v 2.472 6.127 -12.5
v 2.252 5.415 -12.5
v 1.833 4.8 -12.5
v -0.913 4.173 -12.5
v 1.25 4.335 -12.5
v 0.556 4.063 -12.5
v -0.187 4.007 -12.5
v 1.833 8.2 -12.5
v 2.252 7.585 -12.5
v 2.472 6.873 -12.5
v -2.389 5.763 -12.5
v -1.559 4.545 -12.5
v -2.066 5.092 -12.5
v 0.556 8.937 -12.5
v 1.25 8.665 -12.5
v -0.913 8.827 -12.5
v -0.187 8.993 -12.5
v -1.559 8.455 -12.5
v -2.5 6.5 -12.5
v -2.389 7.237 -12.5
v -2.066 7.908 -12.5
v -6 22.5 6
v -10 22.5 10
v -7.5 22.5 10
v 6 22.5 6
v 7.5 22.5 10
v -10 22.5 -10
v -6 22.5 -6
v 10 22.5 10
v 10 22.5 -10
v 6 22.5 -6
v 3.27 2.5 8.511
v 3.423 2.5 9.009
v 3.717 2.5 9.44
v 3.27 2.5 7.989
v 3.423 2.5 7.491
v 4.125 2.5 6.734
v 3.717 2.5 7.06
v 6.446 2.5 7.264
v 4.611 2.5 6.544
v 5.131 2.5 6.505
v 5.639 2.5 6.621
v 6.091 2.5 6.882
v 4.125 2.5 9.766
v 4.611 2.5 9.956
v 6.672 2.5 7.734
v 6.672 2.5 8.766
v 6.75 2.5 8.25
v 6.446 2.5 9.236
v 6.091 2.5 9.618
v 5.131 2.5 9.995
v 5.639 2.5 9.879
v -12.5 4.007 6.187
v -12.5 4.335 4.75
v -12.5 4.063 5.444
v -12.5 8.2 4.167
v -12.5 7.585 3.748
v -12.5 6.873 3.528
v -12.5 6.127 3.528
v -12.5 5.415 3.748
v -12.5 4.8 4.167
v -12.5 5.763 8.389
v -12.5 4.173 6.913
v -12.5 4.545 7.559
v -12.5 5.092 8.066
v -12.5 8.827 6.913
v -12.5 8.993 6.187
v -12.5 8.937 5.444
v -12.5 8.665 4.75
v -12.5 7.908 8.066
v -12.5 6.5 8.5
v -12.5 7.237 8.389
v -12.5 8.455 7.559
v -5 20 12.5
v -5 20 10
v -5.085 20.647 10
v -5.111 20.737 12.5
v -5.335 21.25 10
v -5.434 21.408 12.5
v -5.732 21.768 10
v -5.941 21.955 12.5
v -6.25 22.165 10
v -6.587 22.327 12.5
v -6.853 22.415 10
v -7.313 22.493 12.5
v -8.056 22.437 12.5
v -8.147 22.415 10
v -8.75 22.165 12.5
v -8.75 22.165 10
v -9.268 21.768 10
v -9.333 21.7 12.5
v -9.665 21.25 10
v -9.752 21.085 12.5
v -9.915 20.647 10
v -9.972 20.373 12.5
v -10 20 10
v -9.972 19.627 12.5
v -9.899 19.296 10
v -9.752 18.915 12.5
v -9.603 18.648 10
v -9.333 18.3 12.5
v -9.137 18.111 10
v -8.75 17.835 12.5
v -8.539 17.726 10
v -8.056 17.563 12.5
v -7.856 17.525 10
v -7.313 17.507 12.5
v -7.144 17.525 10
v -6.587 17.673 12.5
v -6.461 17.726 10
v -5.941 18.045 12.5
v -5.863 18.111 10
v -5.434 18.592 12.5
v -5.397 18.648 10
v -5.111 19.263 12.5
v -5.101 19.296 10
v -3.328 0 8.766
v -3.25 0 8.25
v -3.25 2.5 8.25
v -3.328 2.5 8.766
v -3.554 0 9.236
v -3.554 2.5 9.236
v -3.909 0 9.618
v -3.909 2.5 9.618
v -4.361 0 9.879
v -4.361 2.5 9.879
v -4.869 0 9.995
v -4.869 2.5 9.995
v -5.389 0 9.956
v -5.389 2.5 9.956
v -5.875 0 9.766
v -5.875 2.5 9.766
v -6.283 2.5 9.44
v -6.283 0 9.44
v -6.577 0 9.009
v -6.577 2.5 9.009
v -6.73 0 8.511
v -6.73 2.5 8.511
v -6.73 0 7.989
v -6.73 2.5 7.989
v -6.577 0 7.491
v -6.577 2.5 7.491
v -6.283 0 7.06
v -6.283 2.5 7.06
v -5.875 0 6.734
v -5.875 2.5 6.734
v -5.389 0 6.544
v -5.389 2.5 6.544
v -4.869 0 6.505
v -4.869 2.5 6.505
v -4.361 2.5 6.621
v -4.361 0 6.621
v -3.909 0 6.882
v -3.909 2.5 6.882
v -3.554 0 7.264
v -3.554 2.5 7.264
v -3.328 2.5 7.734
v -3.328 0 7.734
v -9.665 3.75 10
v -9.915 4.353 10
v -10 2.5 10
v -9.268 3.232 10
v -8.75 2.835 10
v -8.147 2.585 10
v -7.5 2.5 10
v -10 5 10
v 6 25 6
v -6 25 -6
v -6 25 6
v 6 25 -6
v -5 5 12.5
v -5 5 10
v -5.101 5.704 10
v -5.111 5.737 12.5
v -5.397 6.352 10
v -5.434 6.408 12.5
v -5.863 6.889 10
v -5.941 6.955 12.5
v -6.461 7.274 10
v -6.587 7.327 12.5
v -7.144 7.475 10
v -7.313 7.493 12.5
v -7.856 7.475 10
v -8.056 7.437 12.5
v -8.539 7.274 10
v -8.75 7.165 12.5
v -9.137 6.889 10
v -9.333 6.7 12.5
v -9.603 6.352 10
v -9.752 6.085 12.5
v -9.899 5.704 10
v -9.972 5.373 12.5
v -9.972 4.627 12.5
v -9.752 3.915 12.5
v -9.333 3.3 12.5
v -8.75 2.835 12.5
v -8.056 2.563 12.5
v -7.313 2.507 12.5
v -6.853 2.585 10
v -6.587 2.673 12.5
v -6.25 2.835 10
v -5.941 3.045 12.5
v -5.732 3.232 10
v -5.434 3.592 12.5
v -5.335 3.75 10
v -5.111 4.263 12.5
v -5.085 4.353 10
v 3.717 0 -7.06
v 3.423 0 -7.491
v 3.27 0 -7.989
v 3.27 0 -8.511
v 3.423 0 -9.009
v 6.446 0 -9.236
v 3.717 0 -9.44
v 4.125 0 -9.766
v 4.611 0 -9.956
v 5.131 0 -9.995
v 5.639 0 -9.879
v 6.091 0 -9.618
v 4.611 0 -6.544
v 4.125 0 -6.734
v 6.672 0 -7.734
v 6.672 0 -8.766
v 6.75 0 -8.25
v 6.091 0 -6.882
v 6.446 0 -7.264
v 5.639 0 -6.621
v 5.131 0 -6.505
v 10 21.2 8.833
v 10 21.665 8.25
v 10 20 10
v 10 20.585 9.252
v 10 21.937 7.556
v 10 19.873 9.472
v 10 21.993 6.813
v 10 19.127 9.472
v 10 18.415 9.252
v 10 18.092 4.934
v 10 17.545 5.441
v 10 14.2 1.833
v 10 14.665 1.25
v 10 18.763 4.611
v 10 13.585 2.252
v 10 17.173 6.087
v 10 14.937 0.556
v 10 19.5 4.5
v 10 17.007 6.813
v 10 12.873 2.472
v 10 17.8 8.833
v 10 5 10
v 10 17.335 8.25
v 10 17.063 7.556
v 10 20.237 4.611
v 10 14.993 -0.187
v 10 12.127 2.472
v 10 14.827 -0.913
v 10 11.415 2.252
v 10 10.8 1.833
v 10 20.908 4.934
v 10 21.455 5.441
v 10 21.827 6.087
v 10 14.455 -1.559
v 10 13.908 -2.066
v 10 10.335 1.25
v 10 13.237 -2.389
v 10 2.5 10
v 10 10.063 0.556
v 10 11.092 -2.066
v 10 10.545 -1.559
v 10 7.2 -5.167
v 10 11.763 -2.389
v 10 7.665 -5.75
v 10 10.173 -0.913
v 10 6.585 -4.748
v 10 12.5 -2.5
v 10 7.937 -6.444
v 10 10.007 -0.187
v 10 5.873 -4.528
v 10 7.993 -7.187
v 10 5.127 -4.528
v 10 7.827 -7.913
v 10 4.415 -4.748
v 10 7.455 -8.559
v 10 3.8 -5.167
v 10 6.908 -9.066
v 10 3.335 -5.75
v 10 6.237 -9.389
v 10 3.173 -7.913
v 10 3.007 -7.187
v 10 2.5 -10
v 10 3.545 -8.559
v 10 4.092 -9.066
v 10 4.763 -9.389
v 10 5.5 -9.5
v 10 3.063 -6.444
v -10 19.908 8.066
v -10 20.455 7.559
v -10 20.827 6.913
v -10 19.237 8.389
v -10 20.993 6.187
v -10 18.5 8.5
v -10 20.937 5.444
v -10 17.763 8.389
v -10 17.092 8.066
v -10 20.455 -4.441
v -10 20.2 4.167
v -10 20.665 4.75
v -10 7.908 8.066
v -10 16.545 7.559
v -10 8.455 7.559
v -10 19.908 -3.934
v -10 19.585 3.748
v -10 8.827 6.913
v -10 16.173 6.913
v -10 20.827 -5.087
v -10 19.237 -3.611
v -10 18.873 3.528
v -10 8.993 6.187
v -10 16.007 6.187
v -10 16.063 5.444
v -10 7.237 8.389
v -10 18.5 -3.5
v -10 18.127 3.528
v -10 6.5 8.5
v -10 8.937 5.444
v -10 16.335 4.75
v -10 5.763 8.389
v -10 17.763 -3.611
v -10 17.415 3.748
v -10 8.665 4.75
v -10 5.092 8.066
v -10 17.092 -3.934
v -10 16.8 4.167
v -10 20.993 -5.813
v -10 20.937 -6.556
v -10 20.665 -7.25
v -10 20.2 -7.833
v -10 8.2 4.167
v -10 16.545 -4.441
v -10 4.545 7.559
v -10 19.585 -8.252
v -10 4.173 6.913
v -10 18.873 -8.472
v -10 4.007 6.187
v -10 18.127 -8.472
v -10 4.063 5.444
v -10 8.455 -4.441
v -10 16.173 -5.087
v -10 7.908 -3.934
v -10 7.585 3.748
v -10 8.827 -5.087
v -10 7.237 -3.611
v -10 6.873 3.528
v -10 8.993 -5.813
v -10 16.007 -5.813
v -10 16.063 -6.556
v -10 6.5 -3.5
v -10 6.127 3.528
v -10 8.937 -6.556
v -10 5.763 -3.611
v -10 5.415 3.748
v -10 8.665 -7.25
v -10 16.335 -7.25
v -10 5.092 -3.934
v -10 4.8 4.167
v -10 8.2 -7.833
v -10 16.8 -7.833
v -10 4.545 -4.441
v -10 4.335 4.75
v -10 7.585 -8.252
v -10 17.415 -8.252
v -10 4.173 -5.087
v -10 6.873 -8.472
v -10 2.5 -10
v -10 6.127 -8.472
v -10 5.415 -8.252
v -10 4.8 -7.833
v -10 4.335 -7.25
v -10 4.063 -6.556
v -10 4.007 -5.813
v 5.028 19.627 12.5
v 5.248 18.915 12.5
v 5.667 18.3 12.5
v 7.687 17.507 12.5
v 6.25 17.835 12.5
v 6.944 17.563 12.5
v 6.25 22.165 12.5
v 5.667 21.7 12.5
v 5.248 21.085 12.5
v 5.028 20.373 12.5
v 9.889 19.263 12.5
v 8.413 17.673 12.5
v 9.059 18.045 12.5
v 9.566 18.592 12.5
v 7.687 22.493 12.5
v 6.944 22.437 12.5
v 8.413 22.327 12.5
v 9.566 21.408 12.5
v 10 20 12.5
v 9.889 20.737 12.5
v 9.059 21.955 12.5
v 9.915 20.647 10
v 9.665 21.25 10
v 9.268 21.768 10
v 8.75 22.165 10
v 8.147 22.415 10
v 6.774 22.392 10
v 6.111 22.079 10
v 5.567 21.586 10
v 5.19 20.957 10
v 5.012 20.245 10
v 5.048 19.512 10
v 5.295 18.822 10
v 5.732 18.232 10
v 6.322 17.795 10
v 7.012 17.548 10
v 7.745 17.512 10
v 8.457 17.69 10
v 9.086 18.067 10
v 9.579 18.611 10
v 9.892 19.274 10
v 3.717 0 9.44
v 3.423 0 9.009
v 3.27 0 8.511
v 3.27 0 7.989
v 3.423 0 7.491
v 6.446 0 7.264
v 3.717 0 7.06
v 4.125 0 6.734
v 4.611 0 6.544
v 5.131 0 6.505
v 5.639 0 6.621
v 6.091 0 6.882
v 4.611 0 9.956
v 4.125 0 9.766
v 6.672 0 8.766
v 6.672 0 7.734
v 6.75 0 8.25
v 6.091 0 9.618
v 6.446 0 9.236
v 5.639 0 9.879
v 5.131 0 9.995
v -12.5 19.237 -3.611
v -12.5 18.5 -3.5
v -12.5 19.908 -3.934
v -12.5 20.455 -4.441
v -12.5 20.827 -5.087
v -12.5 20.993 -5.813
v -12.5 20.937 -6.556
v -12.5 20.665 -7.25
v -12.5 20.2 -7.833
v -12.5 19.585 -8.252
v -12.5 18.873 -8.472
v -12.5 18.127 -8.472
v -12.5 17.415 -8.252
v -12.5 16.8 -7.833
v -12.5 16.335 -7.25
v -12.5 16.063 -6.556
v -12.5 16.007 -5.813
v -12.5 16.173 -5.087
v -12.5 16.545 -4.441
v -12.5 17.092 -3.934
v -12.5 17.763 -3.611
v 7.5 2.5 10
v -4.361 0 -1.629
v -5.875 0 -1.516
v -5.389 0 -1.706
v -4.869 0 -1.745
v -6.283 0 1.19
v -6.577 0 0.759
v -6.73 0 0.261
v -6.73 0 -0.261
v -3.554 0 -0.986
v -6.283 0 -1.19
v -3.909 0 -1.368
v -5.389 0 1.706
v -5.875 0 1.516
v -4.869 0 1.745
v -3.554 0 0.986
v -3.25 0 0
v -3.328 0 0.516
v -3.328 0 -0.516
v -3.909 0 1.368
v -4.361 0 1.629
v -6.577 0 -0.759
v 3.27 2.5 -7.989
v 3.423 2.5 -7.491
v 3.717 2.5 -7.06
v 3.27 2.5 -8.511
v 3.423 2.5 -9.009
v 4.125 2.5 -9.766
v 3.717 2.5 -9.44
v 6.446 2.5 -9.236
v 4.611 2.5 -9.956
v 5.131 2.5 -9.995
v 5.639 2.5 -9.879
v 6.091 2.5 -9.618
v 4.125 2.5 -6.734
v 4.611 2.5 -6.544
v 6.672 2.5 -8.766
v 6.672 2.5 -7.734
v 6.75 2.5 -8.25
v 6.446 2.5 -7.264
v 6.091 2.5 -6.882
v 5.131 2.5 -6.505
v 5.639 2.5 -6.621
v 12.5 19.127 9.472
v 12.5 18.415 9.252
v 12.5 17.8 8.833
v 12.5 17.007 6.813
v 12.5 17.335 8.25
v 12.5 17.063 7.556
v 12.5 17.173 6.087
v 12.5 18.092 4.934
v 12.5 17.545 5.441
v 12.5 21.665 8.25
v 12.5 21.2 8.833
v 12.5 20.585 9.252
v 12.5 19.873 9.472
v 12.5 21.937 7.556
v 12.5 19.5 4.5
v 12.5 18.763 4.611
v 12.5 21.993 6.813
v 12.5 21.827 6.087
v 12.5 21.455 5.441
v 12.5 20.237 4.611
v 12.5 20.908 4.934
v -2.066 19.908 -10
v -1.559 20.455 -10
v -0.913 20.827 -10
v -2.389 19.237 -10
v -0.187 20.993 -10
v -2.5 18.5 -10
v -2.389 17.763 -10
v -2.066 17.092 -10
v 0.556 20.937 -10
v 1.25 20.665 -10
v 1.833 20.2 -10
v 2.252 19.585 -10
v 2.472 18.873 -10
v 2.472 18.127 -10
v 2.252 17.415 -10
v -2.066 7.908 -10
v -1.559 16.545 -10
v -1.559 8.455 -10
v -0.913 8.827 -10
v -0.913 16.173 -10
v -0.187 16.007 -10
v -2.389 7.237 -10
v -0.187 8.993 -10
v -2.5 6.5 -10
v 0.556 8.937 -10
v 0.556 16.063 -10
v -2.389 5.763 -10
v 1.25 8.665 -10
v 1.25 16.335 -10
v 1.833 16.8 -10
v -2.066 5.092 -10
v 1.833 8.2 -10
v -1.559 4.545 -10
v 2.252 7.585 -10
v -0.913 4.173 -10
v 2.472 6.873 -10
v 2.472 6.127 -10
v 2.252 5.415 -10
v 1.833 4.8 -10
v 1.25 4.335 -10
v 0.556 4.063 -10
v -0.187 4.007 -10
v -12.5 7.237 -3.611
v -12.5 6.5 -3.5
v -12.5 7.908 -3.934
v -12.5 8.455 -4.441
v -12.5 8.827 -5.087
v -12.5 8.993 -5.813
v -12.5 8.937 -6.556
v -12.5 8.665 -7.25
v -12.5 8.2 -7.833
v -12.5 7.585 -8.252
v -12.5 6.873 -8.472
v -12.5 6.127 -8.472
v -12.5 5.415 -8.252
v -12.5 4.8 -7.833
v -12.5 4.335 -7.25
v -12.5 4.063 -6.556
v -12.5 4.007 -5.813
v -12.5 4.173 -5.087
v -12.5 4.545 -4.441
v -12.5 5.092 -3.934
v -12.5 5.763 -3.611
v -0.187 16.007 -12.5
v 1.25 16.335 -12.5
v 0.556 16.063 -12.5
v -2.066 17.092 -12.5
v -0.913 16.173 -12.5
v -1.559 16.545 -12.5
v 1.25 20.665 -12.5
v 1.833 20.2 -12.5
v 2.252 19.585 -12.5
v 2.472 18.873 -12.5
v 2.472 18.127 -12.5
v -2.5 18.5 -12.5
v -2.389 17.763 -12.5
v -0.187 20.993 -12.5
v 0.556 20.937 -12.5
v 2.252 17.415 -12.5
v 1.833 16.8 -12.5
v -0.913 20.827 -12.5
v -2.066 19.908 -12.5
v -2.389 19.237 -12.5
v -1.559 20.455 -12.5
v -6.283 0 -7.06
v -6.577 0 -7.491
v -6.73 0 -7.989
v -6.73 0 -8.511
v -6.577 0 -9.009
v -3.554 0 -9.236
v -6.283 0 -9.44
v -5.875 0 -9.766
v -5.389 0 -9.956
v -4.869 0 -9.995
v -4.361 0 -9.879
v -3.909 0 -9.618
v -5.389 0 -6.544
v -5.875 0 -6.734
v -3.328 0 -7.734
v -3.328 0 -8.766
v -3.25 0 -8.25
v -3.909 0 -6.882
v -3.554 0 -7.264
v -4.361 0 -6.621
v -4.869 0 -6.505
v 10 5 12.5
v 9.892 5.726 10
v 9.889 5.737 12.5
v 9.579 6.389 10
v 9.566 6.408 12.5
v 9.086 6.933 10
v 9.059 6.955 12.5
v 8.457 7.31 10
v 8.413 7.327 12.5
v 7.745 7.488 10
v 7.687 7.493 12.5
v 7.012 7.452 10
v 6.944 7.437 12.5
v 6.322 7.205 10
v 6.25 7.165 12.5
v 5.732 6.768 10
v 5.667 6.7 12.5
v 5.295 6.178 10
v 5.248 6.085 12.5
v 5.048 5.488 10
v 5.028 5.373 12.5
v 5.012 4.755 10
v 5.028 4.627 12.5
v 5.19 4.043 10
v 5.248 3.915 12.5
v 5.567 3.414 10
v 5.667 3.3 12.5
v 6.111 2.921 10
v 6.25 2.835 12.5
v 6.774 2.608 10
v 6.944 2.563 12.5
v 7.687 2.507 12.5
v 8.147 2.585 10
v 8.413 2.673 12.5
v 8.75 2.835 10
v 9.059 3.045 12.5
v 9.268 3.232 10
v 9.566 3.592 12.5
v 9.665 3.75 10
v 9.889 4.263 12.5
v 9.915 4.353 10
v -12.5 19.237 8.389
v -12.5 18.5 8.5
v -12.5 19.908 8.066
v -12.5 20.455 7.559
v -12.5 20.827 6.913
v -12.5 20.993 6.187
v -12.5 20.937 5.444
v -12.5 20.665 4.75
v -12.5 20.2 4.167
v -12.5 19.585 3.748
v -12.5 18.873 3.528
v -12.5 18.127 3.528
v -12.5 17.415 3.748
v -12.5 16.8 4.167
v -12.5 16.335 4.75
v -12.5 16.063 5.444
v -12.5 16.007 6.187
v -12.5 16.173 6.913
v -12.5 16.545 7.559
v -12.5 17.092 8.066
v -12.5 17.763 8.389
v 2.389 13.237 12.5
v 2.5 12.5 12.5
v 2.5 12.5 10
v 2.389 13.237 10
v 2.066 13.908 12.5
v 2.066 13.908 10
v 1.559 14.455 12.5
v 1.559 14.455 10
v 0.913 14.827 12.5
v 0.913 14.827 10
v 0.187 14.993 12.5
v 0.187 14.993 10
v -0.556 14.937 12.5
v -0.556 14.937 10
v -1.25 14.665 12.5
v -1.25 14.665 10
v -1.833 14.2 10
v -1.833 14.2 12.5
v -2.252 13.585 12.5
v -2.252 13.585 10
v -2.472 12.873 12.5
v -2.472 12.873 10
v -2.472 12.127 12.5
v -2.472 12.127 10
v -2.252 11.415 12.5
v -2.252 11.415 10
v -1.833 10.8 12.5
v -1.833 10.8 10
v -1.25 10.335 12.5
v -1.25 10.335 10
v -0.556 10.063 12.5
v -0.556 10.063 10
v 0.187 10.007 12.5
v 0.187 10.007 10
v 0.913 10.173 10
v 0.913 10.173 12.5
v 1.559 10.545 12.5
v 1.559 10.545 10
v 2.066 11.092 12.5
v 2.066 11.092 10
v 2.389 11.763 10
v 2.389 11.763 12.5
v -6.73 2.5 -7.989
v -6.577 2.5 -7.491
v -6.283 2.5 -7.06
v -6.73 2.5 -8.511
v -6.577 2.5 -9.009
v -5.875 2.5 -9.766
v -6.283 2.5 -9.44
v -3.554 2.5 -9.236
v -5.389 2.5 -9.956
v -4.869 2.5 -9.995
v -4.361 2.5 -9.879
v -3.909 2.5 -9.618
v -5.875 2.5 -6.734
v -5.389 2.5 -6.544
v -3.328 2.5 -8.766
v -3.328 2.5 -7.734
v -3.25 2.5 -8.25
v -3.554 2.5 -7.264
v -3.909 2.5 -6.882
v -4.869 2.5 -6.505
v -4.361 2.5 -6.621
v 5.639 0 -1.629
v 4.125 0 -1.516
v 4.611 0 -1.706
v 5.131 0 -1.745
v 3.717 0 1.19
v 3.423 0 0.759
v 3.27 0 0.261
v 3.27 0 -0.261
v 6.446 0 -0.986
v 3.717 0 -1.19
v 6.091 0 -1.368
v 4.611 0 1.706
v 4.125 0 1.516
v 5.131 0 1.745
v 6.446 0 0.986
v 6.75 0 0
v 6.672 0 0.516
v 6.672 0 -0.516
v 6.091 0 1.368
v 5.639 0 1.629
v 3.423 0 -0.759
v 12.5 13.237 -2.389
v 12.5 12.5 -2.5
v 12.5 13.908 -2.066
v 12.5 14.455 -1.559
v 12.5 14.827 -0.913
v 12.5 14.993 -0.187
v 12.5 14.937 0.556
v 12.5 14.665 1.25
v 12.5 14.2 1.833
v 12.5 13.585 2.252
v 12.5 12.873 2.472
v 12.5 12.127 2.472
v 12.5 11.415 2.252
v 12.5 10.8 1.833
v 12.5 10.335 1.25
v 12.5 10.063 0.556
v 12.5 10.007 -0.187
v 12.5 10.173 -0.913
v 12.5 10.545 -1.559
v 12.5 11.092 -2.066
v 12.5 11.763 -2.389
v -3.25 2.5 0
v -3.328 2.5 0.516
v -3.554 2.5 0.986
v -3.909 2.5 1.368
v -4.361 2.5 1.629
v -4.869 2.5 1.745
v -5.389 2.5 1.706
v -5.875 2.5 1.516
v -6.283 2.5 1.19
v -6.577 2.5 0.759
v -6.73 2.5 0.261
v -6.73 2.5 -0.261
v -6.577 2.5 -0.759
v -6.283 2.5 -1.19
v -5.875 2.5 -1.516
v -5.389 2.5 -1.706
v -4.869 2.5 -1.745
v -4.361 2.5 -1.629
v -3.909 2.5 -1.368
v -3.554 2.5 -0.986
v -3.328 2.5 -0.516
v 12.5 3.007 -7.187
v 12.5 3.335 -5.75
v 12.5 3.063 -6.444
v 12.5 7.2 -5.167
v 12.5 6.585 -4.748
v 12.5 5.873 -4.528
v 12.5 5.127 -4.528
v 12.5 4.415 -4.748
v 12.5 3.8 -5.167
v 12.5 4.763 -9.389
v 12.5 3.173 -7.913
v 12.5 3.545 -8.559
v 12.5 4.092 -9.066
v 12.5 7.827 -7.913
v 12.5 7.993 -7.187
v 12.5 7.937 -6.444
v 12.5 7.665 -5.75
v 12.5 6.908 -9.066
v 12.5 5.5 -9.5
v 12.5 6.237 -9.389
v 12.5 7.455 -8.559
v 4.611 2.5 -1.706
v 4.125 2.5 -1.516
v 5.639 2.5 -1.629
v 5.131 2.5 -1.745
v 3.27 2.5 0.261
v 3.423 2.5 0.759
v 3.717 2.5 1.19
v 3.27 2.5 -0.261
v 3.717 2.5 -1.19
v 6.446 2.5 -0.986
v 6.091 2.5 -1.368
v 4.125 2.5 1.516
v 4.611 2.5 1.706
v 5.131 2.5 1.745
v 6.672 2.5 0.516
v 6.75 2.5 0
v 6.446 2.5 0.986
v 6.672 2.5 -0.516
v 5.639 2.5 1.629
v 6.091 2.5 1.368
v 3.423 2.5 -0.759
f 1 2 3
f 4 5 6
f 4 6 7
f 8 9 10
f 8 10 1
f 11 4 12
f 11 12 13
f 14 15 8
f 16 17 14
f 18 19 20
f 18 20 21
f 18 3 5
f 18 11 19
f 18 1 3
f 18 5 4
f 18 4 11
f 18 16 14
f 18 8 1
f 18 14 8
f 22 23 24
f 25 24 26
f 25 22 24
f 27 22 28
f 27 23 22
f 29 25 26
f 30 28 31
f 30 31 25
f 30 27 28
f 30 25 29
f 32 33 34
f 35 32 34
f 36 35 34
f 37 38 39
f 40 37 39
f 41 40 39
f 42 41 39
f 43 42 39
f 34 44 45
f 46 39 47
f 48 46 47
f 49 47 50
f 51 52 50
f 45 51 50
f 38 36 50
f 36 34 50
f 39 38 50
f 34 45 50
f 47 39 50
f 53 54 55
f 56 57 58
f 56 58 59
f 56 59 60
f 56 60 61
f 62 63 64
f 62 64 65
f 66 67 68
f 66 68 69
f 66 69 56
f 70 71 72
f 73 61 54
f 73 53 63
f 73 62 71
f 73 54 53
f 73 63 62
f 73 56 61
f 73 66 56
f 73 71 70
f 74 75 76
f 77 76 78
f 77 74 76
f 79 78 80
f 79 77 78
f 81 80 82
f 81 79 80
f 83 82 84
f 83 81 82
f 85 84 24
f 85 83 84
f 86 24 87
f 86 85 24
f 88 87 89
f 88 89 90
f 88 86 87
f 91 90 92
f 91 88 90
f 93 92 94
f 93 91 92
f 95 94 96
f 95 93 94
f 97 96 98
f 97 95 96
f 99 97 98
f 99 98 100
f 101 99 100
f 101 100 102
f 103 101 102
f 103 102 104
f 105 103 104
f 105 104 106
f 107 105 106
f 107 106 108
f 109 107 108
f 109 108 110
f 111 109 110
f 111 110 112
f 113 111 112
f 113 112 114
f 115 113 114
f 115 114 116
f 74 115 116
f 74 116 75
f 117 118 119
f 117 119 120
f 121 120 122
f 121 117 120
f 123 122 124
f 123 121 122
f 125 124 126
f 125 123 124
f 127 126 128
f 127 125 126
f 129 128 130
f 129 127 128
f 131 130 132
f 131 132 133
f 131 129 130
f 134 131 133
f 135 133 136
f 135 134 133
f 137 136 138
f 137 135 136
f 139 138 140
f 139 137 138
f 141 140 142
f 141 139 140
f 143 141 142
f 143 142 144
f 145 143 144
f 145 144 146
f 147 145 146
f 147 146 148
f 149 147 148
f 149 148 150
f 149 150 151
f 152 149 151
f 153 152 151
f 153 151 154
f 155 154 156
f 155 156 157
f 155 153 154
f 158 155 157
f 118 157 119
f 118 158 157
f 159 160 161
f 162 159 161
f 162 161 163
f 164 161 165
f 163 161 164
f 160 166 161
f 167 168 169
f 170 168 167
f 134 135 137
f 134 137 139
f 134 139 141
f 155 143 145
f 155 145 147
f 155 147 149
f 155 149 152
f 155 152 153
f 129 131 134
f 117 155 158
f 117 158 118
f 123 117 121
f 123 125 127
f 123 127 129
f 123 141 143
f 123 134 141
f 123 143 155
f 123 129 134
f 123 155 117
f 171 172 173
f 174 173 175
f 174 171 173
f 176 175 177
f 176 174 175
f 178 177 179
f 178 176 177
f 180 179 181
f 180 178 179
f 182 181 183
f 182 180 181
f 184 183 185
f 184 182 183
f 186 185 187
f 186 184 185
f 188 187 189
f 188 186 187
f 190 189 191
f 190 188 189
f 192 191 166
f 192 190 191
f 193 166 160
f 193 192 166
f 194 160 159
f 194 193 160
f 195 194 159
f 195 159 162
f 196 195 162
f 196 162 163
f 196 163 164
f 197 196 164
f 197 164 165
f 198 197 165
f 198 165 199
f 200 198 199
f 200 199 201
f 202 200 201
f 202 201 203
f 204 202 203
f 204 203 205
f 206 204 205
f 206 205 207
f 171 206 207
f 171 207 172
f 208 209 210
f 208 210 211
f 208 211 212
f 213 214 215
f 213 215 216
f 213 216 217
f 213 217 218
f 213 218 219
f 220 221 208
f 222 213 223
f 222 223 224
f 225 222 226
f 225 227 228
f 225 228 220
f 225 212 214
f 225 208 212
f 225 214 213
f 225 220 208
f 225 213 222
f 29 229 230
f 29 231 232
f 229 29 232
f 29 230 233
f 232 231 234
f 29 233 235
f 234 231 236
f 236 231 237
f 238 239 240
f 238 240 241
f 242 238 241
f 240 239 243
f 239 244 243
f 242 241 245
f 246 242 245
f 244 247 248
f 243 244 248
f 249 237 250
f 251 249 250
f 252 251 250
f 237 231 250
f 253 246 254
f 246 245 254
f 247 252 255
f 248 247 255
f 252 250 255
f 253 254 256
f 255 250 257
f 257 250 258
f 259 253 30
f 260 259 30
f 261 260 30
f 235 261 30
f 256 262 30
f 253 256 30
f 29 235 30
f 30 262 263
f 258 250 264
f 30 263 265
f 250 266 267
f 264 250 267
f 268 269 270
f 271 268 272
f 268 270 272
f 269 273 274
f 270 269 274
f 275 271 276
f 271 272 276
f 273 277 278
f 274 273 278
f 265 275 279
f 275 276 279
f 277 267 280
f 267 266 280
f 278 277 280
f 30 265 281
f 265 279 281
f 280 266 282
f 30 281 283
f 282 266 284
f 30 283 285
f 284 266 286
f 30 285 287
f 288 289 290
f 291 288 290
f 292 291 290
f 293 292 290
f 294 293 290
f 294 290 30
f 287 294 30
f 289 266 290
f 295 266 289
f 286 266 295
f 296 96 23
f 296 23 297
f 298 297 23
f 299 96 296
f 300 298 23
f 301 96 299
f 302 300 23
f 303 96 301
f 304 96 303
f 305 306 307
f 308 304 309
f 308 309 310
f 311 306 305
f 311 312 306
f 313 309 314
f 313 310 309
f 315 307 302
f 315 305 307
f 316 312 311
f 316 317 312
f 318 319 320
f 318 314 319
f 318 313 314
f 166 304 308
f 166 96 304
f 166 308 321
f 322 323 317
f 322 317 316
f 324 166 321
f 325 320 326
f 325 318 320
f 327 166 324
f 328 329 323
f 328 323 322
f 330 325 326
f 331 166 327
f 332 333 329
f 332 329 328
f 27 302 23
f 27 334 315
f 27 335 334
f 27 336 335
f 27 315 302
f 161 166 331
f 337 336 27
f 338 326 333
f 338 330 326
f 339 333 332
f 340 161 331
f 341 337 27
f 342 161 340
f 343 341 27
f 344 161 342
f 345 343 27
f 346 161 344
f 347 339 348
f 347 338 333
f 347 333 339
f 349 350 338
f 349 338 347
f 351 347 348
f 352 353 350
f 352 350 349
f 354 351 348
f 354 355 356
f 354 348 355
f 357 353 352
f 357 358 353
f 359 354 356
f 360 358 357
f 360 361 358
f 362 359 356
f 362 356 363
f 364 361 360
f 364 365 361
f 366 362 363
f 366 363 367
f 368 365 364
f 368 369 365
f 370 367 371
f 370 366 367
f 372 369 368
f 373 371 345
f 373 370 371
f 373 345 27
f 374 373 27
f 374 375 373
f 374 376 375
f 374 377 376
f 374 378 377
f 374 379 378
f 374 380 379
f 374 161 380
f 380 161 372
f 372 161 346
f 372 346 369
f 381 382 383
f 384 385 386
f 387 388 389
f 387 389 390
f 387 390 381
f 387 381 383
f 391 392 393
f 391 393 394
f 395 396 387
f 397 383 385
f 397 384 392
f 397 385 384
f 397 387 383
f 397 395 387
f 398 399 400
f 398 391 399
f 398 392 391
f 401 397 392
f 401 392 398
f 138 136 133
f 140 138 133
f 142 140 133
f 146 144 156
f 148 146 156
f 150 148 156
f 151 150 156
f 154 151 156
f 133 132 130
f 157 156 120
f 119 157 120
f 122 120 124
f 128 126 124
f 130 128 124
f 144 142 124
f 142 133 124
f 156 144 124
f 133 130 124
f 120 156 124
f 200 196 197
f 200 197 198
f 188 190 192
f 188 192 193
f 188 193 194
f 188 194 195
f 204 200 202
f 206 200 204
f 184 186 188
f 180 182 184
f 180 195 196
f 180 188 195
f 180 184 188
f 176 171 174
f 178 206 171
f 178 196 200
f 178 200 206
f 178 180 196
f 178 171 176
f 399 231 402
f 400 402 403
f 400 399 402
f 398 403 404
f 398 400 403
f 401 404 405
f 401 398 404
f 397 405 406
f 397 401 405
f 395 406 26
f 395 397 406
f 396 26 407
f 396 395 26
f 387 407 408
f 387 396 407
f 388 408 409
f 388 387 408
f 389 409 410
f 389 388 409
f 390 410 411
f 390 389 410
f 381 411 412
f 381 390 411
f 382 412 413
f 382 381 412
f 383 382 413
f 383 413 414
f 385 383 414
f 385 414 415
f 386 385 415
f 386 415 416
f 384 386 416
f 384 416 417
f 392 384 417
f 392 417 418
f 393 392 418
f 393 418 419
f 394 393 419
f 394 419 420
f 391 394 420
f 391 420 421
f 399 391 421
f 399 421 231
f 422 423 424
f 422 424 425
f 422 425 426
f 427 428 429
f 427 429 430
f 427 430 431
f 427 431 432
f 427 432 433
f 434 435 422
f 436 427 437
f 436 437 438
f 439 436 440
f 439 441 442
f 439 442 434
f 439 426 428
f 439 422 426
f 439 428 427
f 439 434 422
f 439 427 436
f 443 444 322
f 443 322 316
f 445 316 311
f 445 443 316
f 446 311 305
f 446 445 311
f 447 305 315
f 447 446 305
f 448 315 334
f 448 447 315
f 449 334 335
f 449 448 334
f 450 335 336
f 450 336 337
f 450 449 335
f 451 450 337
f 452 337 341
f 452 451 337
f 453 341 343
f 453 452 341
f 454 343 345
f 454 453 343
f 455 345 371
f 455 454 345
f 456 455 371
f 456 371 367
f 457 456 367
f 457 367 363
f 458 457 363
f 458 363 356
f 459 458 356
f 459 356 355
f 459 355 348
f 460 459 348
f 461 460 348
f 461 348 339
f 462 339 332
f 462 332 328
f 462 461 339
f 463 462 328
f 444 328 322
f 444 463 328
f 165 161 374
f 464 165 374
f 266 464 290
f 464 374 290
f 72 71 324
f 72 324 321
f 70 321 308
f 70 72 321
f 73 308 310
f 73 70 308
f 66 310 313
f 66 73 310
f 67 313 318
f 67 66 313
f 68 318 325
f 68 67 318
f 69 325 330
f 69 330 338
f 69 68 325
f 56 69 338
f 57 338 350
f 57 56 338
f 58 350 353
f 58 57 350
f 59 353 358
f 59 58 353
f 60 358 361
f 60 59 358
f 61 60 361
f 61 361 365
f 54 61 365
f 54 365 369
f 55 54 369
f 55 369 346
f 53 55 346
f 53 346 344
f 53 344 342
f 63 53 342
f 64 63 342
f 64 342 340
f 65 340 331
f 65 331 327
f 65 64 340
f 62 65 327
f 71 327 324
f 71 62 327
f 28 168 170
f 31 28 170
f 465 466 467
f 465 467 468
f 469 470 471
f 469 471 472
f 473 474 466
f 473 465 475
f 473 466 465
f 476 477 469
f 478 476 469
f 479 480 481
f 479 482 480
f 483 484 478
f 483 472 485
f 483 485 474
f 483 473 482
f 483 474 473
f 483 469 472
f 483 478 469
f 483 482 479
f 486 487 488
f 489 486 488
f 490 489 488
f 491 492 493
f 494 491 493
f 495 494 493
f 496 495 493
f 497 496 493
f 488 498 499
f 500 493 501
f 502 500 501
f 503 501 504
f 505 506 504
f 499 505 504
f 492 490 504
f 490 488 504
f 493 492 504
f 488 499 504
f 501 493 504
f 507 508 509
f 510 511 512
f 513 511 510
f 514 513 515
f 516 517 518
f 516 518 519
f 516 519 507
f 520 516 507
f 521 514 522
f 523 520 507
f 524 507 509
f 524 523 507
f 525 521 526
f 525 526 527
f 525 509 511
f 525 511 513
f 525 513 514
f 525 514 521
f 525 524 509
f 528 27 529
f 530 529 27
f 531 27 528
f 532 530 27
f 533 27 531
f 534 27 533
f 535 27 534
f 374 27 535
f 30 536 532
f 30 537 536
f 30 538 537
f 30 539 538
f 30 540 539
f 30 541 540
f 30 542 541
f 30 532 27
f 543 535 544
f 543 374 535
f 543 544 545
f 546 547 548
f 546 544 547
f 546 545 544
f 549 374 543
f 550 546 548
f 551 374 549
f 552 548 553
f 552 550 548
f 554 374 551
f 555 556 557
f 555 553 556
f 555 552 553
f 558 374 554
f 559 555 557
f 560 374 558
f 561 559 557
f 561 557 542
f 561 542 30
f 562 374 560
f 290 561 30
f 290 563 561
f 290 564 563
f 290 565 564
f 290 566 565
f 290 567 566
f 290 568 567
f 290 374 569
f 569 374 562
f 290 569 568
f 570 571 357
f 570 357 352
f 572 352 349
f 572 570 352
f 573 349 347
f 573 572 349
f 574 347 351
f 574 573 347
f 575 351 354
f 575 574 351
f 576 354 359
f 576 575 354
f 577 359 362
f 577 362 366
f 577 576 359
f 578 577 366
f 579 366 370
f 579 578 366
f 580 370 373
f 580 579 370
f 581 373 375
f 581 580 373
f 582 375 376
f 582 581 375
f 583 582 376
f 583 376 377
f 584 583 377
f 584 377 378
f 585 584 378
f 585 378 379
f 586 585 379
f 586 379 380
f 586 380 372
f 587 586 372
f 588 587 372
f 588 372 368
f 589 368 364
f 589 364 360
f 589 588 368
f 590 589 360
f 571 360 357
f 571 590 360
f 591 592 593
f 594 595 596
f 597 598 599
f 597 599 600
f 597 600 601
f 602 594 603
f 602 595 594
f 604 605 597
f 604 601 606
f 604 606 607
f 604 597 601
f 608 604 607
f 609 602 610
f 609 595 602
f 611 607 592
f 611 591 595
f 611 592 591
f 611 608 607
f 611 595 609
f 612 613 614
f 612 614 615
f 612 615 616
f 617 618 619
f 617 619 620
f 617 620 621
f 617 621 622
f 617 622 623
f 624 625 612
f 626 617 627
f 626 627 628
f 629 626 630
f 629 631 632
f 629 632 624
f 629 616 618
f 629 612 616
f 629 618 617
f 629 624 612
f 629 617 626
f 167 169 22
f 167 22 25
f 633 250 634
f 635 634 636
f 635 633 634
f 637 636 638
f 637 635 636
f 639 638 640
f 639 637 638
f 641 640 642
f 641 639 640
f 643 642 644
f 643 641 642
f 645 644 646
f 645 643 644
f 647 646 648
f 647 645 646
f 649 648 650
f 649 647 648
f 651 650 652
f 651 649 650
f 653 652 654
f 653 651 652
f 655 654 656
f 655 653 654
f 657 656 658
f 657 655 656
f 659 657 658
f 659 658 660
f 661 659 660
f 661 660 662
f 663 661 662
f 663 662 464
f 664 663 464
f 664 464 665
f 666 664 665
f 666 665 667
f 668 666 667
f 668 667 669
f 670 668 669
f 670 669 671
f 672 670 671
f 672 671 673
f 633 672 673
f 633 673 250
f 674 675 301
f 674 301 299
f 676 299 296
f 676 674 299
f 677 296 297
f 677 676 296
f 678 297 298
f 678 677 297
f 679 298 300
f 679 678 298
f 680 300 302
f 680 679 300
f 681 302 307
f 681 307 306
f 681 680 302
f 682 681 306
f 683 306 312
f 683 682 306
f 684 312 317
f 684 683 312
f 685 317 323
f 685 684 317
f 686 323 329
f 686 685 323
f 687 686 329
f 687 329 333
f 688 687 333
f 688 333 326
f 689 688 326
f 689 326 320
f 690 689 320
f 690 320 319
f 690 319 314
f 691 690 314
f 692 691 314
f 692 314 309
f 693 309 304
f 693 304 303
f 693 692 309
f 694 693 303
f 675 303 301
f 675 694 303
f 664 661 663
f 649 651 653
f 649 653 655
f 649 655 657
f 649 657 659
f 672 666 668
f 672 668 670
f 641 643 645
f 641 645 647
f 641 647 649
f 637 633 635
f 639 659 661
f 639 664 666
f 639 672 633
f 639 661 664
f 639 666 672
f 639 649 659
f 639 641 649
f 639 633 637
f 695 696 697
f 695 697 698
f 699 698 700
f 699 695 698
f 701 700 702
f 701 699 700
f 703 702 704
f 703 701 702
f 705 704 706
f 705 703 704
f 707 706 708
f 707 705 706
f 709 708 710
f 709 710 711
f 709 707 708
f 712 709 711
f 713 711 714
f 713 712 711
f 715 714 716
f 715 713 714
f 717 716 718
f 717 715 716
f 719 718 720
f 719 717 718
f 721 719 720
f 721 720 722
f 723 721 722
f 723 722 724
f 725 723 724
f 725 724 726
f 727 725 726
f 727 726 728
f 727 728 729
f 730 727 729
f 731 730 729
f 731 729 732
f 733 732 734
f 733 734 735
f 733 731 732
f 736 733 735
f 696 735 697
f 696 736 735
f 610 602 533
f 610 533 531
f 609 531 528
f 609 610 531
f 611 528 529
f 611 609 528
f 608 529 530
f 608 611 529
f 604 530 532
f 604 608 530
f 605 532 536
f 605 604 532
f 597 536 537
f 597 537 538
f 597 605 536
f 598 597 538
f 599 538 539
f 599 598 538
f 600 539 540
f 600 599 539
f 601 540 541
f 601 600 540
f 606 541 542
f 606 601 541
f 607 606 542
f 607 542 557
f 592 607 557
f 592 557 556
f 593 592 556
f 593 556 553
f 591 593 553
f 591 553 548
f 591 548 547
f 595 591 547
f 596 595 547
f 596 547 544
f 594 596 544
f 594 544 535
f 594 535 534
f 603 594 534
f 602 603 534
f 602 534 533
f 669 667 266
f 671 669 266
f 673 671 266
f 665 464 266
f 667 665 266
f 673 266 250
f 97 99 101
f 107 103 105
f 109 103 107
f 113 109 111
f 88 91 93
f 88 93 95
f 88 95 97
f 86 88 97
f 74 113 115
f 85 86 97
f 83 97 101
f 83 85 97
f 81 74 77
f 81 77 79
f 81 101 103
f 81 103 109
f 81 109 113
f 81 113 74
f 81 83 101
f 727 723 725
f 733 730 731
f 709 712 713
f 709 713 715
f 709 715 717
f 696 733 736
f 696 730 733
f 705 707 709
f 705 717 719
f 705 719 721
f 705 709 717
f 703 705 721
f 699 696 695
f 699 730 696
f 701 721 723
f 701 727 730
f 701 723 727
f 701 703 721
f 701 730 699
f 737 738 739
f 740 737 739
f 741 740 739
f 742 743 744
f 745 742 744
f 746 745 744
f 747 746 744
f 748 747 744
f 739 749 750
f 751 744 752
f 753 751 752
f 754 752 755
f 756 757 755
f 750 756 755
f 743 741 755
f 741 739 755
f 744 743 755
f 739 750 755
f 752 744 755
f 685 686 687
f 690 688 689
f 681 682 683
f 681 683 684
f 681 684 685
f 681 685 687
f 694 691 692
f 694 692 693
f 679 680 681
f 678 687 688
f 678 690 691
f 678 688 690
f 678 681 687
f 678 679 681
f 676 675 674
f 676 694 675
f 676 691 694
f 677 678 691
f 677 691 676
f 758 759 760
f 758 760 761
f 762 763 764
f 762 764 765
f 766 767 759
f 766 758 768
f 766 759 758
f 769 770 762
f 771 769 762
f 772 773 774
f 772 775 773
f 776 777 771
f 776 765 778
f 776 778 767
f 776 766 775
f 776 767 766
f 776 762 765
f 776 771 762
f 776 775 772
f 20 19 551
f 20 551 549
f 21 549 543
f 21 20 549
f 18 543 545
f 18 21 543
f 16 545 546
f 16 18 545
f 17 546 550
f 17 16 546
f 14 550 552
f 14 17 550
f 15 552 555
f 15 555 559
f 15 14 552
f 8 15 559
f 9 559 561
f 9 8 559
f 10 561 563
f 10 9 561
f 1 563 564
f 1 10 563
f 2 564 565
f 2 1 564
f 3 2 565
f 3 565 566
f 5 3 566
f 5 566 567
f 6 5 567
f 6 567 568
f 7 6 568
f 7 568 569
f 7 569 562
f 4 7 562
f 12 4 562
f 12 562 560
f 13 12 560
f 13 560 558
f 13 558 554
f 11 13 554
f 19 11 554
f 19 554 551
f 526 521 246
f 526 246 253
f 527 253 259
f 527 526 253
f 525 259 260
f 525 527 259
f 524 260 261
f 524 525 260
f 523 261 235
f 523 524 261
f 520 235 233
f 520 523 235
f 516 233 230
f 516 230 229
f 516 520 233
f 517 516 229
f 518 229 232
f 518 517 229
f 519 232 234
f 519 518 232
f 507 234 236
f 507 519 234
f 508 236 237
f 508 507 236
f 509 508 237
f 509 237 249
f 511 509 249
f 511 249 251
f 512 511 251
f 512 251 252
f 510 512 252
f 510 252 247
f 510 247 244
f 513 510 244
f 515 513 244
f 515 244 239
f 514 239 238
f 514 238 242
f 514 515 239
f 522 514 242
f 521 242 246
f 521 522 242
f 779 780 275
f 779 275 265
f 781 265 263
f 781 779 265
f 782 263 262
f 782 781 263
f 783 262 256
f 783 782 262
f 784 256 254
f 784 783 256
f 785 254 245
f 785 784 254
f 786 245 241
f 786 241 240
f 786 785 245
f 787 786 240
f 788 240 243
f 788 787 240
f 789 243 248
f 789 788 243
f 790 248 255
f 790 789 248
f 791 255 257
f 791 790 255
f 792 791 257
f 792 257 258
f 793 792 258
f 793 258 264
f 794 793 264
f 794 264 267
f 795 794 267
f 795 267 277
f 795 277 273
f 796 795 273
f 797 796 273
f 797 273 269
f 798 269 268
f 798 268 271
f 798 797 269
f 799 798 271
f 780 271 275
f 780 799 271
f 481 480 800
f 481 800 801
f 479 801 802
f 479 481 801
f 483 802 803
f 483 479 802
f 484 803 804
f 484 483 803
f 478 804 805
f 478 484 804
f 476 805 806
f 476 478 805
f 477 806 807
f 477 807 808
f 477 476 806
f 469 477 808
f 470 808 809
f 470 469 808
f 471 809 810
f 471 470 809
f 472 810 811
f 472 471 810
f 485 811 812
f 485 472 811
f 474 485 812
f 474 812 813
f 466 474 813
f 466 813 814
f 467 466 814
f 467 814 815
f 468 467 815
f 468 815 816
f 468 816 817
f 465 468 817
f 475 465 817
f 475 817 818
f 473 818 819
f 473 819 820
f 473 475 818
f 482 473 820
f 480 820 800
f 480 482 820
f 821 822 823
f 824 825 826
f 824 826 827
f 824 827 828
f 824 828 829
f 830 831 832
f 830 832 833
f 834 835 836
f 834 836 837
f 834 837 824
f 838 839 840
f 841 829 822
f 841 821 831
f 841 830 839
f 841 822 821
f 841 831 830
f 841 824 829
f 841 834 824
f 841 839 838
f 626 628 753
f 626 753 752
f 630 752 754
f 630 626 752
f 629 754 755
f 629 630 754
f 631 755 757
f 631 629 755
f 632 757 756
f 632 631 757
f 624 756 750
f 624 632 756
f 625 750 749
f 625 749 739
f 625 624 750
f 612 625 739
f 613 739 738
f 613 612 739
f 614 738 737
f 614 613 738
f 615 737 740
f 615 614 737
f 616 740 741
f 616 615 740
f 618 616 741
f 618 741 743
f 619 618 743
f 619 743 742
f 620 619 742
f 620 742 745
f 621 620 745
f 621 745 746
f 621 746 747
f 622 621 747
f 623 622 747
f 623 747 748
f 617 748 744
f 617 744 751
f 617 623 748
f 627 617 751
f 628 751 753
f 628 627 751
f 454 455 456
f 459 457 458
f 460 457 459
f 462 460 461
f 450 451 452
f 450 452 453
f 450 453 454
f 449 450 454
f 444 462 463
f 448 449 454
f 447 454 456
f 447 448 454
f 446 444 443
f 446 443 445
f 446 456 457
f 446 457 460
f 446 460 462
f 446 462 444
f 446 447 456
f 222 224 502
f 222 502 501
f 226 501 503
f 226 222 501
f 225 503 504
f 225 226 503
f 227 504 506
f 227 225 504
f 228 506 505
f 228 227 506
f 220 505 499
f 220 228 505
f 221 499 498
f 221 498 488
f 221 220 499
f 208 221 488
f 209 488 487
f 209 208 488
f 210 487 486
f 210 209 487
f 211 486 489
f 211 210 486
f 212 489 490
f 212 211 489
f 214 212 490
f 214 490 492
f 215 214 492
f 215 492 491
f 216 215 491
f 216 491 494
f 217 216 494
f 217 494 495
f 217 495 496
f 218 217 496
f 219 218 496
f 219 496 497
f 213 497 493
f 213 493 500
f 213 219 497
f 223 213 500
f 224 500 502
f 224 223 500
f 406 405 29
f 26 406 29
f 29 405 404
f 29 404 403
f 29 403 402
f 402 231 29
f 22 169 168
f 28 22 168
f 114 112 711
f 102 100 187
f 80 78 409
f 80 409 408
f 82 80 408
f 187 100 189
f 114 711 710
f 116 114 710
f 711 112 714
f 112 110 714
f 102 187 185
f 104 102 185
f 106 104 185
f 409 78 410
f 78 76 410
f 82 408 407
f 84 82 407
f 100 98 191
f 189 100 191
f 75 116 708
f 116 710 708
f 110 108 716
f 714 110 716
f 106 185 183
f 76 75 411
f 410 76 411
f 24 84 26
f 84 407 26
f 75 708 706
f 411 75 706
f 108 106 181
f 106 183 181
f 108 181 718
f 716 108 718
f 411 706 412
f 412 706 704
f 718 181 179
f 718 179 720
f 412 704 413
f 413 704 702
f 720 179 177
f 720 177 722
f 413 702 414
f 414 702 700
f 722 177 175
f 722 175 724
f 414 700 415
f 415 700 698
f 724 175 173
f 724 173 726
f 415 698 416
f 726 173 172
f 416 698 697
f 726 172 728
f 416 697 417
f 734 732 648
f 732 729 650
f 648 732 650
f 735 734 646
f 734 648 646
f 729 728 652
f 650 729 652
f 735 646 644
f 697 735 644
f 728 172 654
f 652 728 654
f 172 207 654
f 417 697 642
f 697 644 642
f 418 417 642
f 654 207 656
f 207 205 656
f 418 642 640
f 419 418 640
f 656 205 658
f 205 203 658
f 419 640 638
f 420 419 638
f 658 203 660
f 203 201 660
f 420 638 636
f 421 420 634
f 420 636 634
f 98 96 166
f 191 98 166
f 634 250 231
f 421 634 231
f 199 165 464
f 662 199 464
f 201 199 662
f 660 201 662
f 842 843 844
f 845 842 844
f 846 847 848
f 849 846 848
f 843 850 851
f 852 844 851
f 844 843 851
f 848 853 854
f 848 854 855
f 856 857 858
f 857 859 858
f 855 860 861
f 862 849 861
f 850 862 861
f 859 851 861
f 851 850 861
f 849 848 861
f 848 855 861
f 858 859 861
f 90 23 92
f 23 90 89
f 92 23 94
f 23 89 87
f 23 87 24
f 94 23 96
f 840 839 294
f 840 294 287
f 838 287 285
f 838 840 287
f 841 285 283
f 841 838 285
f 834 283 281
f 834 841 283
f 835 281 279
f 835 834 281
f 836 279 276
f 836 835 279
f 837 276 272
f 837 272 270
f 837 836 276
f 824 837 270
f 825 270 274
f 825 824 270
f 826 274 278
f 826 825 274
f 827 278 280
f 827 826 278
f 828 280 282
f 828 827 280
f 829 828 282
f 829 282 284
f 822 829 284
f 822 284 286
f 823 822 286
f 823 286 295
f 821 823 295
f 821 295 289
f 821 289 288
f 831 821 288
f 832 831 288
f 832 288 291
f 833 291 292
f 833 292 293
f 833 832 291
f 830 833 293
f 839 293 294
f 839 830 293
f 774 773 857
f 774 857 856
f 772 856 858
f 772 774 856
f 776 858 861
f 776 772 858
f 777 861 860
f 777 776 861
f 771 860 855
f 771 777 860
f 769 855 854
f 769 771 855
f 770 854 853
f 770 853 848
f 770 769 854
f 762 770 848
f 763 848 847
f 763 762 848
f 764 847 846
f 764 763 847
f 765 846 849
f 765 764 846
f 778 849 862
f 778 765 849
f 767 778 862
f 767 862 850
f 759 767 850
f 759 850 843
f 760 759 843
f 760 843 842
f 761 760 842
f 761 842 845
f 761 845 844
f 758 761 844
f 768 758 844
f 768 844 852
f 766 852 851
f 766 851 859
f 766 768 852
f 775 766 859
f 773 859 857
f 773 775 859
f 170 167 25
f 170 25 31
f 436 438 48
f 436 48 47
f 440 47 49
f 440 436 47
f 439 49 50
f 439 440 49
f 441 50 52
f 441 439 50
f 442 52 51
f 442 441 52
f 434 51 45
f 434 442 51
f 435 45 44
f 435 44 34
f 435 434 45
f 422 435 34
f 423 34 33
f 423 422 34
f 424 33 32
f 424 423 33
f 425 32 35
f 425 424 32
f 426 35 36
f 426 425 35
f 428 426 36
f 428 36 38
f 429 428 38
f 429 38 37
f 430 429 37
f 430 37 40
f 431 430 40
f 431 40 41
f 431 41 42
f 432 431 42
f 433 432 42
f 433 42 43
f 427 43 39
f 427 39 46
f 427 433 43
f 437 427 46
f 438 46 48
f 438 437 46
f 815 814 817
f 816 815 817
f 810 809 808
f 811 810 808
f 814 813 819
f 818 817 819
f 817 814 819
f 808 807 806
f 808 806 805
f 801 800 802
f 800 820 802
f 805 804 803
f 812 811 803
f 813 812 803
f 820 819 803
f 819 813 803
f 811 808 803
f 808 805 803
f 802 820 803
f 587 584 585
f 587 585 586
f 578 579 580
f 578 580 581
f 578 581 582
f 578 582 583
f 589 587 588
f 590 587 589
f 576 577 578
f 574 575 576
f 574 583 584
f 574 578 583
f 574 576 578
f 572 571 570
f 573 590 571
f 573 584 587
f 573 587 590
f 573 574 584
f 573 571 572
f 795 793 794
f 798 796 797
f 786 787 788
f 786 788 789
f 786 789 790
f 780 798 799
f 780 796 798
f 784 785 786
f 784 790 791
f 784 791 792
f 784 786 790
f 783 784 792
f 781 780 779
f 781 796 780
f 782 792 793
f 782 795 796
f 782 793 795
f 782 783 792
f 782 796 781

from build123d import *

# Parameters (mm, degrees)
SKETCH1_W             = 25
SKETCH1_H             = 25
BOSS_EXTRUDE1_DEPTH   = 25
SCALE1_SCALE          = 0.8
SKETCH3_R             = 1.75
BOSS_EXTRUDE2_DEPTH   = 2.5
BOSS_EXTRUDE2_2_DEPTH = 2.5
BOSS_EXTRUDE2_3_DEPTH = 2.5
BOSS_EXTRUDE2_4_DEPTH = 2.5
BOSS_EXTRUDE2_5_DEPTH = 2.5
BOSS_EXTRUDE2_6_DEPTH = 2.5
SKETCH7_R             = 2.5
BOSS_EXTRUDE3_DEPTH   = 2.5
SKETCH5_R             = 2.5
BOSS_EXTRUDE4_DEPTH   = 2.5
SKETCH4_R             = 2.5
BOSS_EXTRUDE5_DEPTH   = 2.5
SKETCH2_W             = 12
SKETCH2_H             = 12
BOSS_EXTRUDE7_DEPTH   = 2.5
SKETCH8_R             = 2.5
BOSS_EXTRUDE8_DEPTH   = 10


with BuildPart() as part:
    # Sketch1 → Boss-Extrude1 (new body)
    with BuildSketch(Plane(origin=(0, 0, 0), x_dir=(1, 0, 0), z_dir=(0, 1, 0))):
        Rectangle(SKETCH1_W, SKETCH1_H)
    extrude(amount=BOSS_EXTRUDE1_DEPTH)


with BuildPart() as part_1:
    # Scale1: scaled about (0, 12.5, 0)
    add(part.part.scale(SCALE1_SCALE).moved(Location((0, 2.5, 0))))

    # Sketch7 → Boss-Extrude3 (add)
    with BuildSketch(Plane.XY.offset(12.5)):
        with Locations((-7.5, 20)):
            Circle(SKETCH7_R)
        with Locations((0, 12.5)):
            Circle(SKETCH7_R)
        with Locations((7.5, 20)):
            Circle(SKETCH7_R)
        with Locations((7.5, 5)):
            Circle(SKETCH7_R)
        with Locations((-7.5, 5)):
            Circle(SKETCH7_R)
    extrude(amount=-BOSS_EXTRUDE3_DEPTH)

    # Sketch5 → Boss-Extrude4 (add)
    with BuildSketch(Plane.ZY.offset(12.5)):
        with Locations((-6, 18.5)):
            Circle(SKETCH5_R)
        with Locations((6, 18.5)):
            Circle(SKETCH5_R)
        with Locations((6, 6.5)):
            Circle(SKETCH5_R)
        with Locations((-6, 6.5)):
            Circle(SKETCH5_R)
    extrude(amount=-BOSS_EXTRUDE4_DEPTH)

    # Sketch4 → Boss-Extrude5 (add)
    with BuildSketch(Plane(origin=(12.5, 0, 0), x_dir=(0, 0, -1), z_dir=(1, 0, 0))):
        with Locations((-7, 19.5)):
            Circle(SKETCH4_R)
        with Locations((0, 12.5)):
            Circle(SKETCH4_R)
        with Locations((7, 5.5)):
            Circle(SKETCH4_R)
    extrude(amount=-BOSS_EXTRUDE5_DEPTH)

    # Sketch2 → Boss-Extrude7 (add)
    with BuildSketch(Plane(origin=(0, 25, 0), x_dir=(1, 0, 0), z_dir=(0, 1, 0))):
        Rectangle(SKETCH2_W, SKETCH2_H)
    extrude(amount=-BOSS_EXTRUDE7_DEPTH)

    # Sketch8 → Boss-Extrude8 (add)
    with BuildSketch(Plane(origin=(0, 0, -12.5), x_dir=(-1, 0, 0), z_dir=(0, 0, -1))):
        with Locations((0, 6.5)):
            Circle(SKETCH8_R)
        with Locations((0, 18.5)):
            Circle(SKETCH8_R)
    extrude(amount=-BOSS_EXTRUDE8_DEPTH)


with BuildPart() as body_2:
    # Sketch3 → Boss-Extrude2 (new body)
    with BuildSketch(Plane.XZ):
        with Locations((-5, 8.25)):
            Circle(SKETCH3_R)
    extrude(amount=-BOSS_EXTRUDE2_DEPTH)


with BuildPart() as body_3:
    # Sketch3 → Boss-Extrude2 2 (new body)
    with BuildSketch(Plane.XZ):
        with Locations((-5, 0)):
            Circle(SKETCH3_R)
    extrude(amount=-BOSS_EXTRUDE2_2_DEPTH)


with BuildPart() as body_4:
    # Sketch3 → Boss-Extrude2 3 (new body)
    with BuildSketch(Plane.XZ):
        with Locations((-5, -8.25)):
            Circle(SKETCH3_R)
    extrude(amount=-BOSS_EXTRUDE2_3_DEPTH)


with BuildPart() as body_5:
    # Sketch3 → Boss-Extrude2 4 (new body)
    with BuildSketch(Plane.XZ):
        with Locations((5, 8.25)):
            Circle(SKETCH3_R)
    extrude(amount=-BOSS_EXTRUDE2_4_DEPTH)


with BuildPart() as body_6:
    # Sketch3 → Boss-Extrude2 5 (new body)
    with BuildSketch(Plane.XZ):
        with Locations((5, 0)):
            Circle(SKETCH3_R)
    extrude(amount=-BOSS_EXTRUDE2_5_DEPTH)


with BuildPart() as body_7:
    # Sketch3 → Boss-Extrude2 6 (new body)
    with BuildSketch(Plane.XZ):
        with Locations((5, -8.25)):
            Circle(SKETCH3_R)
    extrude(amount=-BOSS_EXTRUDE2_6_DEPTH)


solid = Compound([part_1.part, body_2.part, body_3.part, body_4.part, body_5.part, body_6.part, body_7.part])
